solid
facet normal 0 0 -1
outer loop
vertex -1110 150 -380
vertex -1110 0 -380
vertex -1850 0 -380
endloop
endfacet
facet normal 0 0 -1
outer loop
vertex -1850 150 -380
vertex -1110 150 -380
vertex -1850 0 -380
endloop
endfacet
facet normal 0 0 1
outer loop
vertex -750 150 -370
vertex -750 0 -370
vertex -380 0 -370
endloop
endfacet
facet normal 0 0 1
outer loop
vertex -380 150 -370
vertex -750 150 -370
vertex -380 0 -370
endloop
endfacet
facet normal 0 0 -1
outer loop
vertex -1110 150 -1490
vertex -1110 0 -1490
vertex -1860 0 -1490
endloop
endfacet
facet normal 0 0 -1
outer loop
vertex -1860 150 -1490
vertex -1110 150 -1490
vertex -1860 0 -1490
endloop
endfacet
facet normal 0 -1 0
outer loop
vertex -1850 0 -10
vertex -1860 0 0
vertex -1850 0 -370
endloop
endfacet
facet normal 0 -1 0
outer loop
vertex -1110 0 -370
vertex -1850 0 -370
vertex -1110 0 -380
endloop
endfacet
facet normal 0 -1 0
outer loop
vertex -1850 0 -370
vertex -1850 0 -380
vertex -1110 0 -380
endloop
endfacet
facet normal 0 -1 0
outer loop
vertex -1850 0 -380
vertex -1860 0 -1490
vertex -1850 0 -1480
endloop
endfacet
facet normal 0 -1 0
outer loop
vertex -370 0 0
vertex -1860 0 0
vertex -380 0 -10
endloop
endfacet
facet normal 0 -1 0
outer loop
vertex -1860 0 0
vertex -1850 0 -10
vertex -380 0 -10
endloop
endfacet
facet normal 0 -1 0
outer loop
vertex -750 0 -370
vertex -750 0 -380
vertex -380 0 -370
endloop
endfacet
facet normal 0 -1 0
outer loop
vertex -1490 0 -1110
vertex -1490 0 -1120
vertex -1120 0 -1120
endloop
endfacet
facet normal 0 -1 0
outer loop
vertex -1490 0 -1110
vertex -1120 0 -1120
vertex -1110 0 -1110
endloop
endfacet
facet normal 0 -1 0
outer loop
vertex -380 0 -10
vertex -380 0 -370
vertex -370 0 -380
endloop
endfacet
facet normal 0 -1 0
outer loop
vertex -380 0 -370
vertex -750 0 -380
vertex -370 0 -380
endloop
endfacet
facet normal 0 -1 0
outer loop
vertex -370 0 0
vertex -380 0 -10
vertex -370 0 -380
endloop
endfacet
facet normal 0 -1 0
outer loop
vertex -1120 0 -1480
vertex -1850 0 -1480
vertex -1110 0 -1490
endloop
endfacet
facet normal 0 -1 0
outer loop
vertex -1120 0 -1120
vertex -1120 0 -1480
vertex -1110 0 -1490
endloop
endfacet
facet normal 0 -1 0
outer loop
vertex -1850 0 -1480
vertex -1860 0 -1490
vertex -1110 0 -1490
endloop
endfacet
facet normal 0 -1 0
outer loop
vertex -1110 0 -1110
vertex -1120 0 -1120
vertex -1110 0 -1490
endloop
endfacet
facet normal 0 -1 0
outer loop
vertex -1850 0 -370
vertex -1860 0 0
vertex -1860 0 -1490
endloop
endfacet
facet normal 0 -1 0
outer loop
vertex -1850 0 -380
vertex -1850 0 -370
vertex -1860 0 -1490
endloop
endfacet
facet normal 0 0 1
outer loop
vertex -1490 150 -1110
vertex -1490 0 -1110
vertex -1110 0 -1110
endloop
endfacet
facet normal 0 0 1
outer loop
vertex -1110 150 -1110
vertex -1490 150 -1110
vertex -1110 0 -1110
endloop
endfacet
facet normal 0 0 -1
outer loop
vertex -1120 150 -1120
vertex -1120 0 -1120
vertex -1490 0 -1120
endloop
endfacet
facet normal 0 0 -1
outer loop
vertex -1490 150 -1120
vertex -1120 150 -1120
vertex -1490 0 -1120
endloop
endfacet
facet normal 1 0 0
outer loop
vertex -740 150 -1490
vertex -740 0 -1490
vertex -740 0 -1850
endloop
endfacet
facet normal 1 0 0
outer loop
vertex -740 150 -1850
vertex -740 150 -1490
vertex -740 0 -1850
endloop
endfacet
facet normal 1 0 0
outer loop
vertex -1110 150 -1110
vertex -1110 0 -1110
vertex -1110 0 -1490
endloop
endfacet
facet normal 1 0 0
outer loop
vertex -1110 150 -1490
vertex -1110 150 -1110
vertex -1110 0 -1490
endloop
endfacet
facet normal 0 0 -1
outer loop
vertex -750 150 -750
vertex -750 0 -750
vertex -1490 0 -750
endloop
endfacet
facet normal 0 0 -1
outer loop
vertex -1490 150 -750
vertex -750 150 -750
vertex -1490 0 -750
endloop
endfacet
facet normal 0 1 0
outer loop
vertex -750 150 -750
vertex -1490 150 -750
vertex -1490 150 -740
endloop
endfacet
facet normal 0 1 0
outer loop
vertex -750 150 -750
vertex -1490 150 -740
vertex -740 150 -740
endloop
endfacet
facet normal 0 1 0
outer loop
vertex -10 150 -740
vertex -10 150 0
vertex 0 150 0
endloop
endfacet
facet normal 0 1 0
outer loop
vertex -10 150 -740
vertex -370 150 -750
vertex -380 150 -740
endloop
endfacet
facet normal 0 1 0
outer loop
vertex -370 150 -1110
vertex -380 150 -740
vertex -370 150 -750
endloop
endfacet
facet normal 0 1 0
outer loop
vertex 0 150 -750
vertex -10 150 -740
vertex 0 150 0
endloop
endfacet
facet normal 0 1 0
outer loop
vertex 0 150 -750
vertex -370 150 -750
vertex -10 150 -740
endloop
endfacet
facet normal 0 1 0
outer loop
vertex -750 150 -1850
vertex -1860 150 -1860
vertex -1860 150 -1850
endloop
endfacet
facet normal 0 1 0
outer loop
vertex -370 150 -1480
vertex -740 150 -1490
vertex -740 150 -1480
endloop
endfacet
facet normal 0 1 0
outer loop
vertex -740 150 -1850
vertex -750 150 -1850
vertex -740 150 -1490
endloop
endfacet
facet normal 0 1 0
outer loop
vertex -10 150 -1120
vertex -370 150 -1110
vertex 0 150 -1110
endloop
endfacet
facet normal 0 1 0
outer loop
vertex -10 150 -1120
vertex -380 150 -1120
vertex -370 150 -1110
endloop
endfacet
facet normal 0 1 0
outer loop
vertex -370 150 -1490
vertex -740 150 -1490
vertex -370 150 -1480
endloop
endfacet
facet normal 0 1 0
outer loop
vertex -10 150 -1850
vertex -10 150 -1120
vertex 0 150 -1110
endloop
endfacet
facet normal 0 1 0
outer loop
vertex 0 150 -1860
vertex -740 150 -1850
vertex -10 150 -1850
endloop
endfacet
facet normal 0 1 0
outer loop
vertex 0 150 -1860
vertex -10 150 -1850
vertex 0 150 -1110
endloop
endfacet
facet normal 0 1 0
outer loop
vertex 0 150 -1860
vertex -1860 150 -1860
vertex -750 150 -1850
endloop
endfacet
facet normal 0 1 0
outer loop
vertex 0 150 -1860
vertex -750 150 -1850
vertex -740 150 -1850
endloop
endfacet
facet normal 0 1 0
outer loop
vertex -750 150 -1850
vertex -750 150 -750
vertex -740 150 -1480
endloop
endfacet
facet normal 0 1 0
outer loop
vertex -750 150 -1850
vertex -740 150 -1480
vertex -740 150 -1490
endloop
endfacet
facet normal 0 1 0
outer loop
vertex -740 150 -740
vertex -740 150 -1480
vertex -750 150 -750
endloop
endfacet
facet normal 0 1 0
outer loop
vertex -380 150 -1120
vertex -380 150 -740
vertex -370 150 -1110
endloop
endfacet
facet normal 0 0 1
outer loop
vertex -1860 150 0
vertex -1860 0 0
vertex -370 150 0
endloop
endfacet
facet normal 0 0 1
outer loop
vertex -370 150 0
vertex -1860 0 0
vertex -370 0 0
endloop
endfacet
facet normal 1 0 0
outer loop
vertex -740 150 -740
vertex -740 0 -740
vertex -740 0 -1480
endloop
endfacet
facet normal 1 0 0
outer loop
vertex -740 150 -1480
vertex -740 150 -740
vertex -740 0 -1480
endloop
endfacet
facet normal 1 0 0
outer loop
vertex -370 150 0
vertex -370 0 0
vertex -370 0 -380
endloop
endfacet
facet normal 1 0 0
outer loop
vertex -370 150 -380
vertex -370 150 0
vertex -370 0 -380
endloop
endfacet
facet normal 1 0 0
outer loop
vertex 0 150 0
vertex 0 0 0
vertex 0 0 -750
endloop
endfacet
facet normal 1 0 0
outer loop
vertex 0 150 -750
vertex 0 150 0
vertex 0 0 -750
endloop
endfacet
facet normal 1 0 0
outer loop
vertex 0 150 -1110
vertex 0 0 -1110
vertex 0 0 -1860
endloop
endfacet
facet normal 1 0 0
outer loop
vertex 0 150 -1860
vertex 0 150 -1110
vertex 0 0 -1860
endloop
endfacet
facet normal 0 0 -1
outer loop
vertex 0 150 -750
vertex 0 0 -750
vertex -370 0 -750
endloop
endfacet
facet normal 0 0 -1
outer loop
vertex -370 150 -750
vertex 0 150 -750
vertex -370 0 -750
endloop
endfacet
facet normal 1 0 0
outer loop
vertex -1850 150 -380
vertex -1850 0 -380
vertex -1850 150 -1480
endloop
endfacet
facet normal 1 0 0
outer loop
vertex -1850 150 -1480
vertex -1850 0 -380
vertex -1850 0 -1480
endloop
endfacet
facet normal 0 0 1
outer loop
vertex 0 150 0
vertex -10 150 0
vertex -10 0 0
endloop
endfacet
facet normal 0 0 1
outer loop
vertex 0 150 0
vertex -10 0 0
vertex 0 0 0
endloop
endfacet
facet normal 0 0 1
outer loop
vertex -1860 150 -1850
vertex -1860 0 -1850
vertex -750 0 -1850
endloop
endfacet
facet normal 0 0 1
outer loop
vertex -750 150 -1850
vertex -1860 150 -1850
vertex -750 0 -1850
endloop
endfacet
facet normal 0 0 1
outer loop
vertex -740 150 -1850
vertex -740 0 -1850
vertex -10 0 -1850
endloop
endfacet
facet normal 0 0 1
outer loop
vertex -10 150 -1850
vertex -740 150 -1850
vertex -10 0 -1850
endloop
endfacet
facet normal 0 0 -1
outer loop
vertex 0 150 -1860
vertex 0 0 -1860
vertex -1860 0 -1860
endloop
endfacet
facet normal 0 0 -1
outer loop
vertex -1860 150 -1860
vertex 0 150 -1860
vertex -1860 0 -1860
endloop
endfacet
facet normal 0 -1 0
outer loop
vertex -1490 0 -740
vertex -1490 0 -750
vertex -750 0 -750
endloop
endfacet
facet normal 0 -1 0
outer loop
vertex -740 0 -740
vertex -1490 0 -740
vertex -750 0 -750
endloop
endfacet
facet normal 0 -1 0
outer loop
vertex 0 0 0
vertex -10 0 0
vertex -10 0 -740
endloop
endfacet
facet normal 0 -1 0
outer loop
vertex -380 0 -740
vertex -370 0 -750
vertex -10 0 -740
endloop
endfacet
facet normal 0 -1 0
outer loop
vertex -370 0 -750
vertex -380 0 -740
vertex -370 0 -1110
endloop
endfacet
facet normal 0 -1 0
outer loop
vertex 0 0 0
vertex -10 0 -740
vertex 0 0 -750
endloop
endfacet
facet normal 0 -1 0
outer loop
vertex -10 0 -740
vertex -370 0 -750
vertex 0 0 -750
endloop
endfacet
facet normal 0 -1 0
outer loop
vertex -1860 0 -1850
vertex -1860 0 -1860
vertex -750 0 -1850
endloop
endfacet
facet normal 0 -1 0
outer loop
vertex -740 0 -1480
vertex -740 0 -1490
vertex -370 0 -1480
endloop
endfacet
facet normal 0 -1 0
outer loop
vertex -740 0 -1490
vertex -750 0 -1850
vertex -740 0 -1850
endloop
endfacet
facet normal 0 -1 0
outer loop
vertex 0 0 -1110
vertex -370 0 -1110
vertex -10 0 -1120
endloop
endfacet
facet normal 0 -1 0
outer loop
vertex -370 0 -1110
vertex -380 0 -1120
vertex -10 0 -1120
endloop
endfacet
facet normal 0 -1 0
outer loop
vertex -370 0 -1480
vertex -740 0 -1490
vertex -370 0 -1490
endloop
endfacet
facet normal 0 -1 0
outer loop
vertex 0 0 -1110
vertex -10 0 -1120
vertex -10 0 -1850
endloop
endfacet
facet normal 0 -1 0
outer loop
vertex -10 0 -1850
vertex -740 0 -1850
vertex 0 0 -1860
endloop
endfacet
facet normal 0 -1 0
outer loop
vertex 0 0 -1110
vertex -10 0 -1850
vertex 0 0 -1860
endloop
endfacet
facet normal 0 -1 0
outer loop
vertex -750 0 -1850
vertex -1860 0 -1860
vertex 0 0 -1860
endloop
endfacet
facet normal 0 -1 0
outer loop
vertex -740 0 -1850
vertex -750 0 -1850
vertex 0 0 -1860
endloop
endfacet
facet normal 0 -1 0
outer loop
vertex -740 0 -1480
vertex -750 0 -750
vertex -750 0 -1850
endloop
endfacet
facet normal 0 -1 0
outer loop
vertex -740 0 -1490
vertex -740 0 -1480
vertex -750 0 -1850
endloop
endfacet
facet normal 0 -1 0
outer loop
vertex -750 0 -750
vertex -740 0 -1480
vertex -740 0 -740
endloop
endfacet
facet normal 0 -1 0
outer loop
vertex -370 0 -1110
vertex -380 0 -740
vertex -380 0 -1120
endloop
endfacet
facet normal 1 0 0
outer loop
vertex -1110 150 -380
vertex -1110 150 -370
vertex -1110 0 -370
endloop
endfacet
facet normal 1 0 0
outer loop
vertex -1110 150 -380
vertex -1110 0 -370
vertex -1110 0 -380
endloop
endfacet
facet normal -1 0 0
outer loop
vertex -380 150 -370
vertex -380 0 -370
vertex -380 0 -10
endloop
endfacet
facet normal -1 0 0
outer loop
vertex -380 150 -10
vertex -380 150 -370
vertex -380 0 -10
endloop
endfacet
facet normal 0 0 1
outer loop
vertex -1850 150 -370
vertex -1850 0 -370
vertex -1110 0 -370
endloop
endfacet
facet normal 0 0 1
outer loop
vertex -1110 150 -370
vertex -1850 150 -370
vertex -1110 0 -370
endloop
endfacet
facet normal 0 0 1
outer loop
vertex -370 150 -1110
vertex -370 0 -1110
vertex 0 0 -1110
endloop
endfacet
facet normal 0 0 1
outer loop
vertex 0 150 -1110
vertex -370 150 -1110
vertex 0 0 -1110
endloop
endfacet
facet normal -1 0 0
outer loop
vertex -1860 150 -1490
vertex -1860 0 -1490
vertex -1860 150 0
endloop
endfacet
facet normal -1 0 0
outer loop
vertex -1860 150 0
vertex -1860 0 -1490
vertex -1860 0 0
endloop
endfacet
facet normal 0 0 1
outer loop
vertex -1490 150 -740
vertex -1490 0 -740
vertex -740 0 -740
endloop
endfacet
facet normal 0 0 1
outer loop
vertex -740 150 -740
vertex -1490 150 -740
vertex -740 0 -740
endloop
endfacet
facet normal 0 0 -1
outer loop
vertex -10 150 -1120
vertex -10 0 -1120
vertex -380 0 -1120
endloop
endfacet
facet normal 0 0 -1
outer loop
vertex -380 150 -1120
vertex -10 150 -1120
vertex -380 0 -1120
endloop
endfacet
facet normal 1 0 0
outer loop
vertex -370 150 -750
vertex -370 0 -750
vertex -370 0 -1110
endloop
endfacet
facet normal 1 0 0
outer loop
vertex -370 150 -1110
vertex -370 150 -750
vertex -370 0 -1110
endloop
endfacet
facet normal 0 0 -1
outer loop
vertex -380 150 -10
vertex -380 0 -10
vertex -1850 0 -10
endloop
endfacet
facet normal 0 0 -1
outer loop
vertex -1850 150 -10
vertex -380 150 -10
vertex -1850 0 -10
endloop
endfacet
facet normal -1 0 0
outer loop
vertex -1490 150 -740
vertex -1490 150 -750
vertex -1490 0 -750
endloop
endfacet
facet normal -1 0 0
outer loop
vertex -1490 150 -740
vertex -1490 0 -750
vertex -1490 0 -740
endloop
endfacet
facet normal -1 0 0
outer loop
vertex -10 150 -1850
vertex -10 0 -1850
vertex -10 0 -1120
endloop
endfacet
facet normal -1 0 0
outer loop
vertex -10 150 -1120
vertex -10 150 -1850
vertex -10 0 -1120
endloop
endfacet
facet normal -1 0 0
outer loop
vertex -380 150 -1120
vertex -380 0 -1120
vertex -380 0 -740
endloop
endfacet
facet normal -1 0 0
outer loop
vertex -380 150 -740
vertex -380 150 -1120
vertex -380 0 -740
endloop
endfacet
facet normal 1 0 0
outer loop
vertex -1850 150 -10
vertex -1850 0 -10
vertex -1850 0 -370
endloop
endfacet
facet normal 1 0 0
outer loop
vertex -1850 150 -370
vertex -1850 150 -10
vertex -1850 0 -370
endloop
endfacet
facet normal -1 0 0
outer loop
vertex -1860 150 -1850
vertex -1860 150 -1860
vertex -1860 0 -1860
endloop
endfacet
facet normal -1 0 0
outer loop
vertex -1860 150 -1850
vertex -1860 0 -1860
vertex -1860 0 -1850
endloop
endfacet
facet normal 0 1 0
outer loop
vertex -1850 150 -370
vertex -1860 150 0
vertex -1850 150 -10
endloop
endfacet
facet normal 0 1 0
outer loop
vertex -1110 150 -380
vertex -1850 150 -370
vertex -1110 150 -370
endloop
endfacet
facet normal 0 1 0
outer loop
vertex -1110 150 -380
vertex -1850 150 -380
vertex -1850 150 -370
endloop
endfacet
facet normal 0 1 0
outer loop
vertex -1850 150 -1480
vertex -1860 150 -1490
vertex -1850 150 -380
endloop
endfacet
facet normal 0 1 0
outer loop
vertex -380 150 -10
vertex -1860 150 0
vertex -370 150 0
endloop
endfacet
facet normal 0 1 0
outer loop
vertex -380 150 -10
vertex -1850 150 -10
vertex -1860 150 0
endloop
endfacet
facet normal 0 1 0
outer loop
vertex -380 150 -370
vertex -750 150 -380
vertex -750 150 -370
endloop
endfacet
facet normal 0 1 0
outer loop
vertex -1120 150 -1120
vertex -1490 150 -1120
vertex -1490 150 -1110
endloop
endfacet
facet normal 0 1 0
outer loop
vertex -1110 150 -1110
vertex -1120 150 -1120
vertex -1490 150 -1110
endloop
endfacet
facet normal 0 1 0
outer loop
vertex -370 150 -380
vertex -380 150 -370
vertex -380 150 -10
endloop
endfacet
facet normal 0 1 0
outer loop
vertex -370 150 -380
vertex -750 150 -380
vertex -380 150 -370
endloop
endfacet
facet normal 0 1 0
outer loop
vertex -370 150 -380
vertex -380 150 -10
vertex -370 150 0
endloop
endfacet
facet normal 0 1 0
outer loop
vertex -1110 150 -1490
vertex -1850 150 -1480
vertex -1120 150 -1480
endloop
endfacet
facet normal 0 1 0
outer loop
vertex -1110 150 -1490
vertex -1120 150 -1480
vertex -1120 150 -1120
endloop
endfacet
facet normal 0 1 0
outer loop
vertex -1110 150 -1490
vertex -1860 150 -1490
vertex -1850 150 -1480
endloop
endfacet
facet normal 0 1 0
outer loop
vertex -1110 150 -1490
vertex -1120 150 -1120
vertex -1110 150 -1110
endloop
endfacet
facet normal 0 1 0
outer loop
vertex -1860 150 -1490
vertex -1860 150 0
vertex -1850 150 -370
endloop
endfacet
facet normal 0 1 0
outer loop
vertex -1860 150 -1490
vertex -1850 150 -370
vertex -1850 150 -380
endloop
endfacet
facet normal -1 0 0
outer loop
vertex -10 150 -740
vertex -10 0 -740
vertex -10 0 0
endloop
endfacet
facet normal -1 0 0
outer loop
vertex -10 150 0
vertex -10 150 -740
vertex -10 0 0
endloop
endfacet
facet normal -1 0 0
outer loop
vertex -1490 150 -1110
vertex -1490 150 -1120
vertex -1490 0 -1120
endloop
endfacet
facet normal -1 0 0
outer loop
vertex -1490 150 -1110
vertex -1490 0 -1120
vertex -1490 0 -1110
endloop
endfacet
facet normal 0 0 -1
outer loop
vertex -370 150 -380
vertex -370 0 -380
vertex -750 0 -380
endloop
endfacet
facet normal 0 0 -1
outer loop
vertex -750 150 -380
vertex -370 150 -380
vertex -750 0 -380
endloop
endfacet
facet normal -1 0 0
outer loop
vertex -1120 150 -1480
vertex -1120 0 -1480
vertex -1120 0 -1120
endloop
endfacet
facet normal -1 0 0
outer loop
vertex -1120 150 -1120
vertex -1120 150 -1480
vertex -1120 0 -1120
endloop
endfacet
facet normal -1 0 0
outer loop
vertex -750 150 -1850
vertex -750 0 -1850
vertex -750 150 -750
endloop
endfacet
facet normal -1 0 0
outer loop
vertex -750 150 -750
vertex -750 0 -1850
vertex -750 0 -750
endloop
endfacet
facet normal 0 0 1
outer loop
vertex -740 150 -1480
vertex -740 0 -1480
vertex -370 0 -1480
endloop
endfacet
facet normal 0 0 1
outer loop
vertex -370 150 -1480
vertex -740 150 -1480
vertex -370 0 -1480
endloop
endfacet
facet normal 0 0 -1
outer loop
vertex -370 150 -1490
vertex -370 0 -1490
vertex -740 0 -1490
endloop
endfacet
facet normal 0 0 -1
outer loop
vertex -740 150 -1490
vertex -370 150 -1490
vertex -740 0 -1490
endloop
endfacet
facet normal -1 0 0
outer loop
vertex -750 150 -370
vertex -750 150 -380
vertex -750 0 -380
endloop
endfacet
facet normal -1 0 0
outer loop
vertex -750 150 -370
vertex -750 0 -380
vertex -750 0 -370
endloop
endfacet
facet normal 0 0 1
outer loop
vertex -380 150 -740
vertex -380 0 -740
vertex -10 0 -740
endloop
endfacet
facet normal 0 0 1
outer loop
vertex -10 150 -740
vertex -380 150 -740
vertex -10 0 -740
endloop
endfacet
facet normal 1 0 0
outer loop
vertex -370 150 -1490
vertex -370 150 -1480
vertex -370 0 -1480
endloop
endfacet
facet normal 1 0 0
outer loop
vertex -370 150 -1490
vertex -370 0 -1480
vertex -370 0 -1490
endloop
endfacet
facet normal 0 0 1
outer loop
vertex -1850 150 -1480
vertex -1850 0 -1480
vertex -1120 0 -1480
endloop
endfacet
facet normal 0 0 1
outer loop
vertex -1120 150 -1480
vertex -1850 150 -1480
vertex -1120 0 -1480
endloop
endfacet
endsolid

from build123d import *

# Parameters (mm, degrees)
BOSS_EXTRUDE1_DEPTH   = 150
BOSS_EXTRUDE1_2_DEPTH = 150


with BuildPart() as part:
    # Sketch1 → Boss-Extrude1 (new body)
    with BuildSketch(Plane(origin=(0, 0, 0), x_dir=(1, 0, 0), z_dir=(0, 1, 0))):
        Polygon((0, 1860), (-1860, 1860), (-1860, 1850), (-750, 1850), (-750, 750), (-1490, 750), (-1490, 740), (-740, 740), (-740, 1480), (-370, 1480), (-370, 1490), (-740, 1490), (-740, 1850), (-10, 1850), (-10, 1120), (-380, 1120), (-380, 740), (-10, 740), (-10, 0), (0, 0), (0, 750), (-370, 750), (-370, 1110), (0, 1110), align=None)
    extrude(amount=BOSS_EXTRUDE1_DEPTH)


with BuildPart() as body_2:
    # Sketch1 → Boss-Extrude1 2 (new body)
    with BuildSketch(Plane(origin=(0, 0, 0), x_dir=(1, 0, 0), z_dir=(0, 1, 0))):
        Polygon((-750, 370), (-380, 370), (-380, 10), (-1850, 10), (-1850, 370), (-1110, 370), (-1110, 380), (-1850, 380), (-1850, 1480), (-1120, 1480), (-1120, 1120), (-1490, 1120), (-1490, 1110), (-1110, 1110), (-1110, 1490), (-1860, 1490), (-1860, 0), (-370, 0), (-370, 380), (-750, 380), align=None)
    extrude(amount=BOSS_EXTRUDE1_2_DEPTH)


solid = Compound([part.part, body_2.part])
